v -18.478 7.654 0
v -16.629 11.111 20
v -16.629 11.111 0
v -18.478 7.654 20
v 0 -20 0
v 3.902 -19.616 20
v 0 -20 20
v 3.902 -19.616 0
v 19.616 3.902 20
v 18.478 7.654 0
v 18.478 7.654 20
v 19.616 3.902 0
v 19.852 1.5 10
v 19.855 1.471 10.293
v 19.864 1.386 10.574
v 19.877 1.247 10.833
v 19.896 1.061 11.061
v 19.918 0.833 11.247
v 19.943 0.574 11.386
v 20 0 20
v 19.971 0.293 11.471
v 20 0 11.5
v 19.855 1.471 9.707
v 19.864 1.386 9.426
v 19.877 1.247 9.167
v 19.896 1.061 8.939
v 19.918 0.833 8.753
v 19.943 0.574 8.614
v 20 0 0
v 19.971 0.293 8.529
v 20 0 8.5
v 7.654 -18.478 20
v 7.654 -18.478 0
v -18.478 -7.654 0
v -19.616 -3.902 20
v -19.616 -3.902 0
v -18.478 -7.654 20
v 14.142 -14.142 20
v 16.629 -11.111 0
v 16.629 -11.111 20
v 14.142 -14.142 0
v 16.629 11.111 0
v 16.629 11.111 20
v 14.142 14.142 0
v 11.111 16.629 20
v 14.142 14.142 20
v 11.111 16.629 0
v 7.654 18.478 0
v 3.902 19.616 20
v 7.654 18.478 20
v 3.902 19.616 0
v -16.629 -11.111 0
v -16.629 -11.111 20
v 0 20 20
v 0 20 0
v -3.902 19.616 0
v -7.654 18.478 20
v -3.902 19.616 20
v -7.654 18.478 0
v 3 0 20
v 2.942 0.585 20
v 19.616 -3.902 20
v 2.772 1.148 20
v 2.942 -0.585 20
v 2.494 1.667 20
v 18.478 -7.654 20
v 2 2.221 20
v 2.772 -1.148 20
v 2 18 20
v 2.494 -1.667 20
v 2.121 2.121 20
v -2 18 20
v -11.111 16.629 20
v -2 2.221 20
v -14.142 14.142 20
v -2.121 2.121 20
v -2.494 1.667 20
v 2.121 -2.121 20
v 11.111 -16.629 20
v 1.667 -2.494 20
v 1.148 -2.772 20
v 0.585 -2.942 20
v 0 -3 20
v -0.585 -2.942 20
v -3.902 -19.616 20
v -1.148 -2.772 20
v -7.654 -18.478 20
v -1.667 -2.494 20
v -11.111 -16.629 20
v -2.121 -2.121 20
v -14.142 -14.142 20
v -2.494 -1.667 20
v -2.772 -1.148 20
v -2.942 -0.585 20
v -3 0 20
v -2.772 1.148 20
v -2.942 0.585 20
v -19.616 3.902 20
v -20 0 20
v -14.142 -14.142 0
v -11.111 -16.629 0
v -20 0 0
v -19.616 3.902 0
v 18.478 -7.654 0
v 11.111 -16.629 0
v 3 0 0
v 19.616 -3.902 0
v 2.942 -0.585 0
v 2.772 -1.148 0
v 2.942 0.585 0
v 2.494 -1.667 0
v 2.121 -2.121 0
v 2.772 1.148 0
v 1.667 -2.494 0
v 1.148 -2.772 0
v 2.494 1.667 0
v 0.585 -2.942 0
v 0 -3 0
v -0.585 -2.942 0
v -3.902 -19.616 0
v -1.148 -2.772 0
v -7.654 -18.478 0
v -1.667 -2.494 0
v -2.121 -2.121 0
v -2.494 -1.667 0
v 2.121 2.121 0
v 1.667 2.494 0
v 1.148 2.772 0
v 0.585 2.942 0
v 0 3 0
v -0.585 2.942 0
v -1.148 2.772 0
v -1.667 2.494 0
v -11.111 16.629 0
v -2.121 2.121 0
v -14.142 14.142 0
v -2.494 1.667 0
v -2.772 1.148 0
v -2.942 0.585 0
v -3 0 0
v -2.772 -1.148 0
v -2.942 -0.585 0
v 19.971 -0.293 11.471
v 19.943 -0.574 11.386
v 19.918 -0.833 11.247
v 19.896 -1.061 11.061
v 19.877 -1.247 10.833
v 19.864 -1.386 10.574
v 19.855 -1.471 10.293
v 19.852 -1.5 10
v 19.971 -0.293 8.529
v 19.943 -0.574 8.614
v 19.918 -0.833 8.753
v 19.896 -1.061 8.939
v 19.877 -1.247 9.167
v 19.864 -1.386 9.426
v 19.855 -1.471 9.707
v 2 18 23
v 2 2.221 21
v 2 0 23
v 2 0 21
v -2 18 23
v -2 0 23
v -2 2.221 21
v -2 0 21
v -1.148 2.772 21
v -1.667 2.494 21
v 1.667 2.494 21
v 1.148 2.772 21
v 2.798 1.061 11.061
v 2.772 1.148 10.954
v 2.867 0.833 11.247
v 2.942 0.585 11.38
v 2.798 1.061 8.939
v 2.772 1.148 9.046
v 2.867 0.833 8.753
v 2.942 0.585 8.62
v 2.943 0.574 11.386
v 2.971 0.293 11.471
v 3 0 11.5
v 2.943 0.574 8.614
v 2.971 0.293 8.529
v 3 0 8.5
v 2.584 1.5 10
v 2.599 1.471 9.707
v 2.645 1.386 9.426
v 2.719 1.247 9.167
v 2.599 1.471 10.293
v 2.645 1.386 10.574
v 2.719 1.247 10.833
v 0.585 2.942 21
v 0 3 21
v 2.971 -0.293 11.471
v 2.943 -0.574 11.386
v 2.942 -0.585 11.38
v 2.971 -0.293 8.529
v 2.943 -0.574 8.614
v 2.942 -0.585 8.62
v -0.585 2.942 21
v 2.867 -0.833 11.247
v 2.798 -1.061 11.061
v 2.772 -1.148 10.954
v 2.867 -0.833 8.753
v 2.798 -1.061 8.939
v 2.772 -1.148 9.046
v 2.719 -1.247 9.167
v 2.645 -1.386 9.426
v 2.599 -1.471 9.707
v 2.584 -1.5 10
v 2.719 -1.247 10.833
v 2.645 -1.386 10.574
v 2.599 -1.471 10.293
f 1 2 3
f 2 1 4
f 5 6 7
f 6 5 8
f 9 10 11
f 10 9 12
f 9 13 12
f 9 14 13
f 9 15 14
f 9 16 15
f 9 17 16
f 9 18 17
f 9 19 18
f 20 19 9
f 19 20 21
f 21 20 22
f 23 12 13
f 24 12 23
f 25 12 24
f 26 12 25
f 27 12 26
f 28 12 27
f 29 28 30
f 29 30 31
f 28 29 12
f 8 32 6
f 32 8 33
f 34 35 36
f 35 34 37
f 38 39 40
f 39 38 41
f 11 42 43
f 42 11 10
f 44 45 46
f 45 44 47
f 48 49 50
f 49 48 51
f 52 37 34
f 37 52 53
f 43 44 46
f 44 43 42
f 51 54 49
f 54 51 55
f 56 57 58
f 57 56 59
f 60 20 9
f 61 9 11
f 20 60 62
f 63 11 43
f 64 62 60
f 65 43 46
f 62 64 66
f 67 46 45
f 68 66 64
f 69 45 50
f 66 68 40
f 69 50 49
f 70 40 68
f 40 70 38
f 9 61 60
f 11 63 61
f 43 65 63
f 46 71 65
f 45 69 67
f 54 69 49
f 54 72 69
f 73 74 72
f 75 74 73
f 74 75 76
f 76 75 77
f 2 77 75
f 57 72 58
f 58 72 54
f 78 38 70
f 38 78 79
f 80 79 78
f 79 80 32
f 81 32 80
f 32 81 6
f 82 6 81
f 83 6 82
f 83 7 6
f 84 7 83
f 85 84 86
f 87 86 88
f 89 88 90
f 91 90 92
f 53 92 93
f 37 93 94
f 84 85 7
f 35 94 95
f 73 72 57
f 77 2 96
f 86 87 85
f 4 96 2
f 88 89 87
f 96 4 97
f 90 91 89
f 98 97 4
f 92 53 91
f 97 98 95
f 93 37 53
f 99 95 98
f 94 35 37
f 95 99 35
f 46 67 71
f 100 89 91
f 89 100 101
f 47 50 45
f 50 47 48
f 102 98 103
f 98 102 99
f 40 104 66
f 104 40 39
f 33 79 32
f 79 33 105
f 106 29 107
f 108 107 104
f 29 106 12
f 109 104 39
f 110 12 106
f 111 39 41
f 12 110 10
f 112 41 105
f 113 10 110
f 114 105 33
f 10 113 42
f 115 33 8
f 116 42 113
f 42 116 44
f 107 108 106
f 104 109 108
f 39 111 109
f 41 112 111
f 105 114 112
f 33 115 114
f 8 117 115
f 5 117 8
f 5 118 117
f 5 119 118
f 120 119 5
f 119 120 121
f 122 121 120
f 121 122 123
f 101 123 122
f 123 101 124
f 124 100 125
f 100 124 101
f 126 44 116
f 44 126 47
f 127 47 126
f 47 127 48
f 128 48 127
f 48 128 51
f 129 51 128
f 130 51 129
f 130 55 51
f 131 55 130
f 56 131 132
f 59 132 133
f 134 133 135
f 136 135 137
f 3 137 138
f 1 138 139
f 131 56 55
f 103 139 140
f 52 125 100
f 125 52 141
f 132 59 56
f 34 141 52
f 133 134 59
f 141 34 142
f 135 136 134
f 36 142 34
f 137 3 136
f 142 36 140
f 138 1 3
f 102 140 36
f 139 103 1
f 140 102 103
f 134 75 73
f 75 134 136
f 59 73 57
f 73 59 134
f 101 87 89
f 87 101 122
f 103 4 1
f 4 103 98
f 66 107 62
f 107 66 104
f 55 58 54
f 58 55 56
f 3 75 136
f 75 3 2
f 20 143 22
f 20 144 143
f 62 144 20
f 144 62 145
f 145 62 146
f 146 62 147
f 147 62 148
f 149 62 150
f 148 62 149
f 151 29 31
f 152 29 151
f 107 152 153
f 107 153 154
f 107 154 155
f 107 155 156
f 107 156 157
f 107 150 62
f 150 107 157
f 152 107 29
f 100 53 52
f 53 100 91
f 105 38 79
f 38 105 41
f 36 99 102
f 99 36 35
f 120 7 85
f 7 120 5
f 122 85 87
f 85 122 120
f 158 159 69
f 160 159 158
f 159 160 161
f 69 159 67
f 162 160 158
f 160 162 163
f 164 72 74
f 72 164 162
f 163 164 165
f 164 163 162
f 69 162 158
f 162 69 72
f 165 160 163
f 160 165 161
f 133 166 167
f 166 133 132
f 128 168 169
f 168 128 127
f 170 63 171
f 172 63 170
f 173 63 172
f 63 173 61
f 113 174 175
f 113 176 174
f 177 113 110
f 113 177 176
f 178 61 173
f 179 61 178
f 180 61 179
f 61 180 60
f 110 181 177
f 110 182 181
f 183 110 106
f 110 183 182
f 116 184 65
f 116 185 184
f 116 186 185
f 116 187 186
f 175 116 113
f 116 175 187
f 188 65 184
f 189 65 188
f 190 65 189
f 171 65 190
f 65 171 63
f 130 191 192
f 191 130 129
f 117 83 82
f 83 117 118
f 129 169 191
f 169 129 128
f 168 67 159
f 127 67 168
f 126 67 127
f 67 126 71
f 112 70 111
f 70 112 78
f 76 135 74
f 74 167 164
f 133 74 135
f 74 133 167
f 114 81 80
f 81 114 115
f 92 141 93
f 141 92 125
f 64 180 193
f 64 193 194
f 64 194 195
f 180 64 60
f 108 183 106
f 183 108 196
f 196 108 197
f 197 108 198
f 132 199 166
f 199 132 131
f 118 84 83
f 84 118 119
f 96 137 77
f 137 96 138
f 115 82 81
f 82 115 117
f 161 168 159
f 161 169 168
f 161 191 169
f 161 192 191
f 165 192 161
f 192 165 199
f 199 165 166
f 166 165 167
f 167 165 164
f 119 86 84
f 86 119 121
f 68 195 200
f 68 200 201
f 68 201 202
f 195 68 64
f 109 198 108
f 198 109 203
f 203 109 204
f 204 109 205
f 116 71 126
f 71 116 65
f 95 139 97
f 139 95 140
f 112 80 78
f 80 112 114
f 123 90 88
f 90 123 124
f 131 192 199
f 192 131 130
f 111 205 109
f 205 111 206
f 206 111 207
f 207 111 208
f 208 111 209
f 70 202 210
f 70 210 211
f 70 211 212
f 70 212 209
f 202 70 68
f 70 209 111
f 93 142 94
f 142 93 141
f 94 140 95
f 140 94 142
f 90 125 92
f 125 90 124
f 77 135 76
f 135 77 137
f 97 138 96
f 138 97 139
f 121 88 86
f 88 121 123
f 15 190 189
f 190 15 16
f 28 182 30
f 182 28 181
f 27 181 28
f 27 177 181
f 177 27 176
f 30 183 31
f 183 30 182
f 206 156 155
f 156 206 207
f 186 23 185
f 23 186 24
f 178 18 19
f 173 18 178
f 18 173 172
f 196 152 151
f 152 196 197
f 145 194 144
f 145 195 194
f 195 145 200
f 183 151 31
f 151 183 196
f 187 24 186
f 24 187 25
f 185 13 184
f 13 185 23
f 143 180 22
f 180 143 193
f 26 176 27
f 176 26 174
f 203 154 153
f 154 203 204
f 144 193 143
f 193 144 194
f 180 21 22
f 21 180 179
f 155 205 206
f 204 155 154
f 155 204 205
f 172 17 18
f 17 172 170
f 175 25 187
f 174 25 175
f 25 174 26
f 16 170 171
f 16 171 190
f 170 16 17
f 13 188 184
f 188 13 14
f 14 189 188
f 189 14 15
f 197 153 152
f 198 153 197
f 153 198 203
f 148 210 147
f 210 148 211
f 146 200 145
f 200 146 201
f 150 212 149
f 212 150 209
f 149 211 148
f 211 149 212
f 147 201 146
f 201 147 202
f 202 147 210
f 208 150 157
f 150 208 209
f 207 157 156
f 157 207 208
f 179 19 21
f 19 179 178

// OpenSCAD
$fn = 32;

// ----------------------------------------------------------------------
// Control knob: pointer knob
// ----------------------------------------------------------------------

// --- parameters (mm) ---
rib_w = 4;                // pointer rib width
rib_h = 4;                // pointer rib height
knob_d = 40;              // knob body diameter
knob_h = 20;              // knob body height
bore_d = 6;               // shaft bore diameter
set_d = 3;                // set screw bore diameter

rib_poke = rib_h - 1;  // rib height above the top
total_h = knob_h + rib_h - 1;  // overall height

difference() {
  union() {
    cylinder(h = knob_h, d = knob_d);
    translate([-rib_w / 2, 0, knob_h - 1])
      cube([rib_w, knob_d / 2 - 2, rib_h]);
  }
  translate([0, 0, -1]) cylinder(h = knob_h + 2, d = bore_d);
  translate([-1, 0, knob_h / 2]) rotate([0, 90, 0])
    cylinder(h = knob_d / 2 + bore_d / 2 + 2, d = set_d);}
